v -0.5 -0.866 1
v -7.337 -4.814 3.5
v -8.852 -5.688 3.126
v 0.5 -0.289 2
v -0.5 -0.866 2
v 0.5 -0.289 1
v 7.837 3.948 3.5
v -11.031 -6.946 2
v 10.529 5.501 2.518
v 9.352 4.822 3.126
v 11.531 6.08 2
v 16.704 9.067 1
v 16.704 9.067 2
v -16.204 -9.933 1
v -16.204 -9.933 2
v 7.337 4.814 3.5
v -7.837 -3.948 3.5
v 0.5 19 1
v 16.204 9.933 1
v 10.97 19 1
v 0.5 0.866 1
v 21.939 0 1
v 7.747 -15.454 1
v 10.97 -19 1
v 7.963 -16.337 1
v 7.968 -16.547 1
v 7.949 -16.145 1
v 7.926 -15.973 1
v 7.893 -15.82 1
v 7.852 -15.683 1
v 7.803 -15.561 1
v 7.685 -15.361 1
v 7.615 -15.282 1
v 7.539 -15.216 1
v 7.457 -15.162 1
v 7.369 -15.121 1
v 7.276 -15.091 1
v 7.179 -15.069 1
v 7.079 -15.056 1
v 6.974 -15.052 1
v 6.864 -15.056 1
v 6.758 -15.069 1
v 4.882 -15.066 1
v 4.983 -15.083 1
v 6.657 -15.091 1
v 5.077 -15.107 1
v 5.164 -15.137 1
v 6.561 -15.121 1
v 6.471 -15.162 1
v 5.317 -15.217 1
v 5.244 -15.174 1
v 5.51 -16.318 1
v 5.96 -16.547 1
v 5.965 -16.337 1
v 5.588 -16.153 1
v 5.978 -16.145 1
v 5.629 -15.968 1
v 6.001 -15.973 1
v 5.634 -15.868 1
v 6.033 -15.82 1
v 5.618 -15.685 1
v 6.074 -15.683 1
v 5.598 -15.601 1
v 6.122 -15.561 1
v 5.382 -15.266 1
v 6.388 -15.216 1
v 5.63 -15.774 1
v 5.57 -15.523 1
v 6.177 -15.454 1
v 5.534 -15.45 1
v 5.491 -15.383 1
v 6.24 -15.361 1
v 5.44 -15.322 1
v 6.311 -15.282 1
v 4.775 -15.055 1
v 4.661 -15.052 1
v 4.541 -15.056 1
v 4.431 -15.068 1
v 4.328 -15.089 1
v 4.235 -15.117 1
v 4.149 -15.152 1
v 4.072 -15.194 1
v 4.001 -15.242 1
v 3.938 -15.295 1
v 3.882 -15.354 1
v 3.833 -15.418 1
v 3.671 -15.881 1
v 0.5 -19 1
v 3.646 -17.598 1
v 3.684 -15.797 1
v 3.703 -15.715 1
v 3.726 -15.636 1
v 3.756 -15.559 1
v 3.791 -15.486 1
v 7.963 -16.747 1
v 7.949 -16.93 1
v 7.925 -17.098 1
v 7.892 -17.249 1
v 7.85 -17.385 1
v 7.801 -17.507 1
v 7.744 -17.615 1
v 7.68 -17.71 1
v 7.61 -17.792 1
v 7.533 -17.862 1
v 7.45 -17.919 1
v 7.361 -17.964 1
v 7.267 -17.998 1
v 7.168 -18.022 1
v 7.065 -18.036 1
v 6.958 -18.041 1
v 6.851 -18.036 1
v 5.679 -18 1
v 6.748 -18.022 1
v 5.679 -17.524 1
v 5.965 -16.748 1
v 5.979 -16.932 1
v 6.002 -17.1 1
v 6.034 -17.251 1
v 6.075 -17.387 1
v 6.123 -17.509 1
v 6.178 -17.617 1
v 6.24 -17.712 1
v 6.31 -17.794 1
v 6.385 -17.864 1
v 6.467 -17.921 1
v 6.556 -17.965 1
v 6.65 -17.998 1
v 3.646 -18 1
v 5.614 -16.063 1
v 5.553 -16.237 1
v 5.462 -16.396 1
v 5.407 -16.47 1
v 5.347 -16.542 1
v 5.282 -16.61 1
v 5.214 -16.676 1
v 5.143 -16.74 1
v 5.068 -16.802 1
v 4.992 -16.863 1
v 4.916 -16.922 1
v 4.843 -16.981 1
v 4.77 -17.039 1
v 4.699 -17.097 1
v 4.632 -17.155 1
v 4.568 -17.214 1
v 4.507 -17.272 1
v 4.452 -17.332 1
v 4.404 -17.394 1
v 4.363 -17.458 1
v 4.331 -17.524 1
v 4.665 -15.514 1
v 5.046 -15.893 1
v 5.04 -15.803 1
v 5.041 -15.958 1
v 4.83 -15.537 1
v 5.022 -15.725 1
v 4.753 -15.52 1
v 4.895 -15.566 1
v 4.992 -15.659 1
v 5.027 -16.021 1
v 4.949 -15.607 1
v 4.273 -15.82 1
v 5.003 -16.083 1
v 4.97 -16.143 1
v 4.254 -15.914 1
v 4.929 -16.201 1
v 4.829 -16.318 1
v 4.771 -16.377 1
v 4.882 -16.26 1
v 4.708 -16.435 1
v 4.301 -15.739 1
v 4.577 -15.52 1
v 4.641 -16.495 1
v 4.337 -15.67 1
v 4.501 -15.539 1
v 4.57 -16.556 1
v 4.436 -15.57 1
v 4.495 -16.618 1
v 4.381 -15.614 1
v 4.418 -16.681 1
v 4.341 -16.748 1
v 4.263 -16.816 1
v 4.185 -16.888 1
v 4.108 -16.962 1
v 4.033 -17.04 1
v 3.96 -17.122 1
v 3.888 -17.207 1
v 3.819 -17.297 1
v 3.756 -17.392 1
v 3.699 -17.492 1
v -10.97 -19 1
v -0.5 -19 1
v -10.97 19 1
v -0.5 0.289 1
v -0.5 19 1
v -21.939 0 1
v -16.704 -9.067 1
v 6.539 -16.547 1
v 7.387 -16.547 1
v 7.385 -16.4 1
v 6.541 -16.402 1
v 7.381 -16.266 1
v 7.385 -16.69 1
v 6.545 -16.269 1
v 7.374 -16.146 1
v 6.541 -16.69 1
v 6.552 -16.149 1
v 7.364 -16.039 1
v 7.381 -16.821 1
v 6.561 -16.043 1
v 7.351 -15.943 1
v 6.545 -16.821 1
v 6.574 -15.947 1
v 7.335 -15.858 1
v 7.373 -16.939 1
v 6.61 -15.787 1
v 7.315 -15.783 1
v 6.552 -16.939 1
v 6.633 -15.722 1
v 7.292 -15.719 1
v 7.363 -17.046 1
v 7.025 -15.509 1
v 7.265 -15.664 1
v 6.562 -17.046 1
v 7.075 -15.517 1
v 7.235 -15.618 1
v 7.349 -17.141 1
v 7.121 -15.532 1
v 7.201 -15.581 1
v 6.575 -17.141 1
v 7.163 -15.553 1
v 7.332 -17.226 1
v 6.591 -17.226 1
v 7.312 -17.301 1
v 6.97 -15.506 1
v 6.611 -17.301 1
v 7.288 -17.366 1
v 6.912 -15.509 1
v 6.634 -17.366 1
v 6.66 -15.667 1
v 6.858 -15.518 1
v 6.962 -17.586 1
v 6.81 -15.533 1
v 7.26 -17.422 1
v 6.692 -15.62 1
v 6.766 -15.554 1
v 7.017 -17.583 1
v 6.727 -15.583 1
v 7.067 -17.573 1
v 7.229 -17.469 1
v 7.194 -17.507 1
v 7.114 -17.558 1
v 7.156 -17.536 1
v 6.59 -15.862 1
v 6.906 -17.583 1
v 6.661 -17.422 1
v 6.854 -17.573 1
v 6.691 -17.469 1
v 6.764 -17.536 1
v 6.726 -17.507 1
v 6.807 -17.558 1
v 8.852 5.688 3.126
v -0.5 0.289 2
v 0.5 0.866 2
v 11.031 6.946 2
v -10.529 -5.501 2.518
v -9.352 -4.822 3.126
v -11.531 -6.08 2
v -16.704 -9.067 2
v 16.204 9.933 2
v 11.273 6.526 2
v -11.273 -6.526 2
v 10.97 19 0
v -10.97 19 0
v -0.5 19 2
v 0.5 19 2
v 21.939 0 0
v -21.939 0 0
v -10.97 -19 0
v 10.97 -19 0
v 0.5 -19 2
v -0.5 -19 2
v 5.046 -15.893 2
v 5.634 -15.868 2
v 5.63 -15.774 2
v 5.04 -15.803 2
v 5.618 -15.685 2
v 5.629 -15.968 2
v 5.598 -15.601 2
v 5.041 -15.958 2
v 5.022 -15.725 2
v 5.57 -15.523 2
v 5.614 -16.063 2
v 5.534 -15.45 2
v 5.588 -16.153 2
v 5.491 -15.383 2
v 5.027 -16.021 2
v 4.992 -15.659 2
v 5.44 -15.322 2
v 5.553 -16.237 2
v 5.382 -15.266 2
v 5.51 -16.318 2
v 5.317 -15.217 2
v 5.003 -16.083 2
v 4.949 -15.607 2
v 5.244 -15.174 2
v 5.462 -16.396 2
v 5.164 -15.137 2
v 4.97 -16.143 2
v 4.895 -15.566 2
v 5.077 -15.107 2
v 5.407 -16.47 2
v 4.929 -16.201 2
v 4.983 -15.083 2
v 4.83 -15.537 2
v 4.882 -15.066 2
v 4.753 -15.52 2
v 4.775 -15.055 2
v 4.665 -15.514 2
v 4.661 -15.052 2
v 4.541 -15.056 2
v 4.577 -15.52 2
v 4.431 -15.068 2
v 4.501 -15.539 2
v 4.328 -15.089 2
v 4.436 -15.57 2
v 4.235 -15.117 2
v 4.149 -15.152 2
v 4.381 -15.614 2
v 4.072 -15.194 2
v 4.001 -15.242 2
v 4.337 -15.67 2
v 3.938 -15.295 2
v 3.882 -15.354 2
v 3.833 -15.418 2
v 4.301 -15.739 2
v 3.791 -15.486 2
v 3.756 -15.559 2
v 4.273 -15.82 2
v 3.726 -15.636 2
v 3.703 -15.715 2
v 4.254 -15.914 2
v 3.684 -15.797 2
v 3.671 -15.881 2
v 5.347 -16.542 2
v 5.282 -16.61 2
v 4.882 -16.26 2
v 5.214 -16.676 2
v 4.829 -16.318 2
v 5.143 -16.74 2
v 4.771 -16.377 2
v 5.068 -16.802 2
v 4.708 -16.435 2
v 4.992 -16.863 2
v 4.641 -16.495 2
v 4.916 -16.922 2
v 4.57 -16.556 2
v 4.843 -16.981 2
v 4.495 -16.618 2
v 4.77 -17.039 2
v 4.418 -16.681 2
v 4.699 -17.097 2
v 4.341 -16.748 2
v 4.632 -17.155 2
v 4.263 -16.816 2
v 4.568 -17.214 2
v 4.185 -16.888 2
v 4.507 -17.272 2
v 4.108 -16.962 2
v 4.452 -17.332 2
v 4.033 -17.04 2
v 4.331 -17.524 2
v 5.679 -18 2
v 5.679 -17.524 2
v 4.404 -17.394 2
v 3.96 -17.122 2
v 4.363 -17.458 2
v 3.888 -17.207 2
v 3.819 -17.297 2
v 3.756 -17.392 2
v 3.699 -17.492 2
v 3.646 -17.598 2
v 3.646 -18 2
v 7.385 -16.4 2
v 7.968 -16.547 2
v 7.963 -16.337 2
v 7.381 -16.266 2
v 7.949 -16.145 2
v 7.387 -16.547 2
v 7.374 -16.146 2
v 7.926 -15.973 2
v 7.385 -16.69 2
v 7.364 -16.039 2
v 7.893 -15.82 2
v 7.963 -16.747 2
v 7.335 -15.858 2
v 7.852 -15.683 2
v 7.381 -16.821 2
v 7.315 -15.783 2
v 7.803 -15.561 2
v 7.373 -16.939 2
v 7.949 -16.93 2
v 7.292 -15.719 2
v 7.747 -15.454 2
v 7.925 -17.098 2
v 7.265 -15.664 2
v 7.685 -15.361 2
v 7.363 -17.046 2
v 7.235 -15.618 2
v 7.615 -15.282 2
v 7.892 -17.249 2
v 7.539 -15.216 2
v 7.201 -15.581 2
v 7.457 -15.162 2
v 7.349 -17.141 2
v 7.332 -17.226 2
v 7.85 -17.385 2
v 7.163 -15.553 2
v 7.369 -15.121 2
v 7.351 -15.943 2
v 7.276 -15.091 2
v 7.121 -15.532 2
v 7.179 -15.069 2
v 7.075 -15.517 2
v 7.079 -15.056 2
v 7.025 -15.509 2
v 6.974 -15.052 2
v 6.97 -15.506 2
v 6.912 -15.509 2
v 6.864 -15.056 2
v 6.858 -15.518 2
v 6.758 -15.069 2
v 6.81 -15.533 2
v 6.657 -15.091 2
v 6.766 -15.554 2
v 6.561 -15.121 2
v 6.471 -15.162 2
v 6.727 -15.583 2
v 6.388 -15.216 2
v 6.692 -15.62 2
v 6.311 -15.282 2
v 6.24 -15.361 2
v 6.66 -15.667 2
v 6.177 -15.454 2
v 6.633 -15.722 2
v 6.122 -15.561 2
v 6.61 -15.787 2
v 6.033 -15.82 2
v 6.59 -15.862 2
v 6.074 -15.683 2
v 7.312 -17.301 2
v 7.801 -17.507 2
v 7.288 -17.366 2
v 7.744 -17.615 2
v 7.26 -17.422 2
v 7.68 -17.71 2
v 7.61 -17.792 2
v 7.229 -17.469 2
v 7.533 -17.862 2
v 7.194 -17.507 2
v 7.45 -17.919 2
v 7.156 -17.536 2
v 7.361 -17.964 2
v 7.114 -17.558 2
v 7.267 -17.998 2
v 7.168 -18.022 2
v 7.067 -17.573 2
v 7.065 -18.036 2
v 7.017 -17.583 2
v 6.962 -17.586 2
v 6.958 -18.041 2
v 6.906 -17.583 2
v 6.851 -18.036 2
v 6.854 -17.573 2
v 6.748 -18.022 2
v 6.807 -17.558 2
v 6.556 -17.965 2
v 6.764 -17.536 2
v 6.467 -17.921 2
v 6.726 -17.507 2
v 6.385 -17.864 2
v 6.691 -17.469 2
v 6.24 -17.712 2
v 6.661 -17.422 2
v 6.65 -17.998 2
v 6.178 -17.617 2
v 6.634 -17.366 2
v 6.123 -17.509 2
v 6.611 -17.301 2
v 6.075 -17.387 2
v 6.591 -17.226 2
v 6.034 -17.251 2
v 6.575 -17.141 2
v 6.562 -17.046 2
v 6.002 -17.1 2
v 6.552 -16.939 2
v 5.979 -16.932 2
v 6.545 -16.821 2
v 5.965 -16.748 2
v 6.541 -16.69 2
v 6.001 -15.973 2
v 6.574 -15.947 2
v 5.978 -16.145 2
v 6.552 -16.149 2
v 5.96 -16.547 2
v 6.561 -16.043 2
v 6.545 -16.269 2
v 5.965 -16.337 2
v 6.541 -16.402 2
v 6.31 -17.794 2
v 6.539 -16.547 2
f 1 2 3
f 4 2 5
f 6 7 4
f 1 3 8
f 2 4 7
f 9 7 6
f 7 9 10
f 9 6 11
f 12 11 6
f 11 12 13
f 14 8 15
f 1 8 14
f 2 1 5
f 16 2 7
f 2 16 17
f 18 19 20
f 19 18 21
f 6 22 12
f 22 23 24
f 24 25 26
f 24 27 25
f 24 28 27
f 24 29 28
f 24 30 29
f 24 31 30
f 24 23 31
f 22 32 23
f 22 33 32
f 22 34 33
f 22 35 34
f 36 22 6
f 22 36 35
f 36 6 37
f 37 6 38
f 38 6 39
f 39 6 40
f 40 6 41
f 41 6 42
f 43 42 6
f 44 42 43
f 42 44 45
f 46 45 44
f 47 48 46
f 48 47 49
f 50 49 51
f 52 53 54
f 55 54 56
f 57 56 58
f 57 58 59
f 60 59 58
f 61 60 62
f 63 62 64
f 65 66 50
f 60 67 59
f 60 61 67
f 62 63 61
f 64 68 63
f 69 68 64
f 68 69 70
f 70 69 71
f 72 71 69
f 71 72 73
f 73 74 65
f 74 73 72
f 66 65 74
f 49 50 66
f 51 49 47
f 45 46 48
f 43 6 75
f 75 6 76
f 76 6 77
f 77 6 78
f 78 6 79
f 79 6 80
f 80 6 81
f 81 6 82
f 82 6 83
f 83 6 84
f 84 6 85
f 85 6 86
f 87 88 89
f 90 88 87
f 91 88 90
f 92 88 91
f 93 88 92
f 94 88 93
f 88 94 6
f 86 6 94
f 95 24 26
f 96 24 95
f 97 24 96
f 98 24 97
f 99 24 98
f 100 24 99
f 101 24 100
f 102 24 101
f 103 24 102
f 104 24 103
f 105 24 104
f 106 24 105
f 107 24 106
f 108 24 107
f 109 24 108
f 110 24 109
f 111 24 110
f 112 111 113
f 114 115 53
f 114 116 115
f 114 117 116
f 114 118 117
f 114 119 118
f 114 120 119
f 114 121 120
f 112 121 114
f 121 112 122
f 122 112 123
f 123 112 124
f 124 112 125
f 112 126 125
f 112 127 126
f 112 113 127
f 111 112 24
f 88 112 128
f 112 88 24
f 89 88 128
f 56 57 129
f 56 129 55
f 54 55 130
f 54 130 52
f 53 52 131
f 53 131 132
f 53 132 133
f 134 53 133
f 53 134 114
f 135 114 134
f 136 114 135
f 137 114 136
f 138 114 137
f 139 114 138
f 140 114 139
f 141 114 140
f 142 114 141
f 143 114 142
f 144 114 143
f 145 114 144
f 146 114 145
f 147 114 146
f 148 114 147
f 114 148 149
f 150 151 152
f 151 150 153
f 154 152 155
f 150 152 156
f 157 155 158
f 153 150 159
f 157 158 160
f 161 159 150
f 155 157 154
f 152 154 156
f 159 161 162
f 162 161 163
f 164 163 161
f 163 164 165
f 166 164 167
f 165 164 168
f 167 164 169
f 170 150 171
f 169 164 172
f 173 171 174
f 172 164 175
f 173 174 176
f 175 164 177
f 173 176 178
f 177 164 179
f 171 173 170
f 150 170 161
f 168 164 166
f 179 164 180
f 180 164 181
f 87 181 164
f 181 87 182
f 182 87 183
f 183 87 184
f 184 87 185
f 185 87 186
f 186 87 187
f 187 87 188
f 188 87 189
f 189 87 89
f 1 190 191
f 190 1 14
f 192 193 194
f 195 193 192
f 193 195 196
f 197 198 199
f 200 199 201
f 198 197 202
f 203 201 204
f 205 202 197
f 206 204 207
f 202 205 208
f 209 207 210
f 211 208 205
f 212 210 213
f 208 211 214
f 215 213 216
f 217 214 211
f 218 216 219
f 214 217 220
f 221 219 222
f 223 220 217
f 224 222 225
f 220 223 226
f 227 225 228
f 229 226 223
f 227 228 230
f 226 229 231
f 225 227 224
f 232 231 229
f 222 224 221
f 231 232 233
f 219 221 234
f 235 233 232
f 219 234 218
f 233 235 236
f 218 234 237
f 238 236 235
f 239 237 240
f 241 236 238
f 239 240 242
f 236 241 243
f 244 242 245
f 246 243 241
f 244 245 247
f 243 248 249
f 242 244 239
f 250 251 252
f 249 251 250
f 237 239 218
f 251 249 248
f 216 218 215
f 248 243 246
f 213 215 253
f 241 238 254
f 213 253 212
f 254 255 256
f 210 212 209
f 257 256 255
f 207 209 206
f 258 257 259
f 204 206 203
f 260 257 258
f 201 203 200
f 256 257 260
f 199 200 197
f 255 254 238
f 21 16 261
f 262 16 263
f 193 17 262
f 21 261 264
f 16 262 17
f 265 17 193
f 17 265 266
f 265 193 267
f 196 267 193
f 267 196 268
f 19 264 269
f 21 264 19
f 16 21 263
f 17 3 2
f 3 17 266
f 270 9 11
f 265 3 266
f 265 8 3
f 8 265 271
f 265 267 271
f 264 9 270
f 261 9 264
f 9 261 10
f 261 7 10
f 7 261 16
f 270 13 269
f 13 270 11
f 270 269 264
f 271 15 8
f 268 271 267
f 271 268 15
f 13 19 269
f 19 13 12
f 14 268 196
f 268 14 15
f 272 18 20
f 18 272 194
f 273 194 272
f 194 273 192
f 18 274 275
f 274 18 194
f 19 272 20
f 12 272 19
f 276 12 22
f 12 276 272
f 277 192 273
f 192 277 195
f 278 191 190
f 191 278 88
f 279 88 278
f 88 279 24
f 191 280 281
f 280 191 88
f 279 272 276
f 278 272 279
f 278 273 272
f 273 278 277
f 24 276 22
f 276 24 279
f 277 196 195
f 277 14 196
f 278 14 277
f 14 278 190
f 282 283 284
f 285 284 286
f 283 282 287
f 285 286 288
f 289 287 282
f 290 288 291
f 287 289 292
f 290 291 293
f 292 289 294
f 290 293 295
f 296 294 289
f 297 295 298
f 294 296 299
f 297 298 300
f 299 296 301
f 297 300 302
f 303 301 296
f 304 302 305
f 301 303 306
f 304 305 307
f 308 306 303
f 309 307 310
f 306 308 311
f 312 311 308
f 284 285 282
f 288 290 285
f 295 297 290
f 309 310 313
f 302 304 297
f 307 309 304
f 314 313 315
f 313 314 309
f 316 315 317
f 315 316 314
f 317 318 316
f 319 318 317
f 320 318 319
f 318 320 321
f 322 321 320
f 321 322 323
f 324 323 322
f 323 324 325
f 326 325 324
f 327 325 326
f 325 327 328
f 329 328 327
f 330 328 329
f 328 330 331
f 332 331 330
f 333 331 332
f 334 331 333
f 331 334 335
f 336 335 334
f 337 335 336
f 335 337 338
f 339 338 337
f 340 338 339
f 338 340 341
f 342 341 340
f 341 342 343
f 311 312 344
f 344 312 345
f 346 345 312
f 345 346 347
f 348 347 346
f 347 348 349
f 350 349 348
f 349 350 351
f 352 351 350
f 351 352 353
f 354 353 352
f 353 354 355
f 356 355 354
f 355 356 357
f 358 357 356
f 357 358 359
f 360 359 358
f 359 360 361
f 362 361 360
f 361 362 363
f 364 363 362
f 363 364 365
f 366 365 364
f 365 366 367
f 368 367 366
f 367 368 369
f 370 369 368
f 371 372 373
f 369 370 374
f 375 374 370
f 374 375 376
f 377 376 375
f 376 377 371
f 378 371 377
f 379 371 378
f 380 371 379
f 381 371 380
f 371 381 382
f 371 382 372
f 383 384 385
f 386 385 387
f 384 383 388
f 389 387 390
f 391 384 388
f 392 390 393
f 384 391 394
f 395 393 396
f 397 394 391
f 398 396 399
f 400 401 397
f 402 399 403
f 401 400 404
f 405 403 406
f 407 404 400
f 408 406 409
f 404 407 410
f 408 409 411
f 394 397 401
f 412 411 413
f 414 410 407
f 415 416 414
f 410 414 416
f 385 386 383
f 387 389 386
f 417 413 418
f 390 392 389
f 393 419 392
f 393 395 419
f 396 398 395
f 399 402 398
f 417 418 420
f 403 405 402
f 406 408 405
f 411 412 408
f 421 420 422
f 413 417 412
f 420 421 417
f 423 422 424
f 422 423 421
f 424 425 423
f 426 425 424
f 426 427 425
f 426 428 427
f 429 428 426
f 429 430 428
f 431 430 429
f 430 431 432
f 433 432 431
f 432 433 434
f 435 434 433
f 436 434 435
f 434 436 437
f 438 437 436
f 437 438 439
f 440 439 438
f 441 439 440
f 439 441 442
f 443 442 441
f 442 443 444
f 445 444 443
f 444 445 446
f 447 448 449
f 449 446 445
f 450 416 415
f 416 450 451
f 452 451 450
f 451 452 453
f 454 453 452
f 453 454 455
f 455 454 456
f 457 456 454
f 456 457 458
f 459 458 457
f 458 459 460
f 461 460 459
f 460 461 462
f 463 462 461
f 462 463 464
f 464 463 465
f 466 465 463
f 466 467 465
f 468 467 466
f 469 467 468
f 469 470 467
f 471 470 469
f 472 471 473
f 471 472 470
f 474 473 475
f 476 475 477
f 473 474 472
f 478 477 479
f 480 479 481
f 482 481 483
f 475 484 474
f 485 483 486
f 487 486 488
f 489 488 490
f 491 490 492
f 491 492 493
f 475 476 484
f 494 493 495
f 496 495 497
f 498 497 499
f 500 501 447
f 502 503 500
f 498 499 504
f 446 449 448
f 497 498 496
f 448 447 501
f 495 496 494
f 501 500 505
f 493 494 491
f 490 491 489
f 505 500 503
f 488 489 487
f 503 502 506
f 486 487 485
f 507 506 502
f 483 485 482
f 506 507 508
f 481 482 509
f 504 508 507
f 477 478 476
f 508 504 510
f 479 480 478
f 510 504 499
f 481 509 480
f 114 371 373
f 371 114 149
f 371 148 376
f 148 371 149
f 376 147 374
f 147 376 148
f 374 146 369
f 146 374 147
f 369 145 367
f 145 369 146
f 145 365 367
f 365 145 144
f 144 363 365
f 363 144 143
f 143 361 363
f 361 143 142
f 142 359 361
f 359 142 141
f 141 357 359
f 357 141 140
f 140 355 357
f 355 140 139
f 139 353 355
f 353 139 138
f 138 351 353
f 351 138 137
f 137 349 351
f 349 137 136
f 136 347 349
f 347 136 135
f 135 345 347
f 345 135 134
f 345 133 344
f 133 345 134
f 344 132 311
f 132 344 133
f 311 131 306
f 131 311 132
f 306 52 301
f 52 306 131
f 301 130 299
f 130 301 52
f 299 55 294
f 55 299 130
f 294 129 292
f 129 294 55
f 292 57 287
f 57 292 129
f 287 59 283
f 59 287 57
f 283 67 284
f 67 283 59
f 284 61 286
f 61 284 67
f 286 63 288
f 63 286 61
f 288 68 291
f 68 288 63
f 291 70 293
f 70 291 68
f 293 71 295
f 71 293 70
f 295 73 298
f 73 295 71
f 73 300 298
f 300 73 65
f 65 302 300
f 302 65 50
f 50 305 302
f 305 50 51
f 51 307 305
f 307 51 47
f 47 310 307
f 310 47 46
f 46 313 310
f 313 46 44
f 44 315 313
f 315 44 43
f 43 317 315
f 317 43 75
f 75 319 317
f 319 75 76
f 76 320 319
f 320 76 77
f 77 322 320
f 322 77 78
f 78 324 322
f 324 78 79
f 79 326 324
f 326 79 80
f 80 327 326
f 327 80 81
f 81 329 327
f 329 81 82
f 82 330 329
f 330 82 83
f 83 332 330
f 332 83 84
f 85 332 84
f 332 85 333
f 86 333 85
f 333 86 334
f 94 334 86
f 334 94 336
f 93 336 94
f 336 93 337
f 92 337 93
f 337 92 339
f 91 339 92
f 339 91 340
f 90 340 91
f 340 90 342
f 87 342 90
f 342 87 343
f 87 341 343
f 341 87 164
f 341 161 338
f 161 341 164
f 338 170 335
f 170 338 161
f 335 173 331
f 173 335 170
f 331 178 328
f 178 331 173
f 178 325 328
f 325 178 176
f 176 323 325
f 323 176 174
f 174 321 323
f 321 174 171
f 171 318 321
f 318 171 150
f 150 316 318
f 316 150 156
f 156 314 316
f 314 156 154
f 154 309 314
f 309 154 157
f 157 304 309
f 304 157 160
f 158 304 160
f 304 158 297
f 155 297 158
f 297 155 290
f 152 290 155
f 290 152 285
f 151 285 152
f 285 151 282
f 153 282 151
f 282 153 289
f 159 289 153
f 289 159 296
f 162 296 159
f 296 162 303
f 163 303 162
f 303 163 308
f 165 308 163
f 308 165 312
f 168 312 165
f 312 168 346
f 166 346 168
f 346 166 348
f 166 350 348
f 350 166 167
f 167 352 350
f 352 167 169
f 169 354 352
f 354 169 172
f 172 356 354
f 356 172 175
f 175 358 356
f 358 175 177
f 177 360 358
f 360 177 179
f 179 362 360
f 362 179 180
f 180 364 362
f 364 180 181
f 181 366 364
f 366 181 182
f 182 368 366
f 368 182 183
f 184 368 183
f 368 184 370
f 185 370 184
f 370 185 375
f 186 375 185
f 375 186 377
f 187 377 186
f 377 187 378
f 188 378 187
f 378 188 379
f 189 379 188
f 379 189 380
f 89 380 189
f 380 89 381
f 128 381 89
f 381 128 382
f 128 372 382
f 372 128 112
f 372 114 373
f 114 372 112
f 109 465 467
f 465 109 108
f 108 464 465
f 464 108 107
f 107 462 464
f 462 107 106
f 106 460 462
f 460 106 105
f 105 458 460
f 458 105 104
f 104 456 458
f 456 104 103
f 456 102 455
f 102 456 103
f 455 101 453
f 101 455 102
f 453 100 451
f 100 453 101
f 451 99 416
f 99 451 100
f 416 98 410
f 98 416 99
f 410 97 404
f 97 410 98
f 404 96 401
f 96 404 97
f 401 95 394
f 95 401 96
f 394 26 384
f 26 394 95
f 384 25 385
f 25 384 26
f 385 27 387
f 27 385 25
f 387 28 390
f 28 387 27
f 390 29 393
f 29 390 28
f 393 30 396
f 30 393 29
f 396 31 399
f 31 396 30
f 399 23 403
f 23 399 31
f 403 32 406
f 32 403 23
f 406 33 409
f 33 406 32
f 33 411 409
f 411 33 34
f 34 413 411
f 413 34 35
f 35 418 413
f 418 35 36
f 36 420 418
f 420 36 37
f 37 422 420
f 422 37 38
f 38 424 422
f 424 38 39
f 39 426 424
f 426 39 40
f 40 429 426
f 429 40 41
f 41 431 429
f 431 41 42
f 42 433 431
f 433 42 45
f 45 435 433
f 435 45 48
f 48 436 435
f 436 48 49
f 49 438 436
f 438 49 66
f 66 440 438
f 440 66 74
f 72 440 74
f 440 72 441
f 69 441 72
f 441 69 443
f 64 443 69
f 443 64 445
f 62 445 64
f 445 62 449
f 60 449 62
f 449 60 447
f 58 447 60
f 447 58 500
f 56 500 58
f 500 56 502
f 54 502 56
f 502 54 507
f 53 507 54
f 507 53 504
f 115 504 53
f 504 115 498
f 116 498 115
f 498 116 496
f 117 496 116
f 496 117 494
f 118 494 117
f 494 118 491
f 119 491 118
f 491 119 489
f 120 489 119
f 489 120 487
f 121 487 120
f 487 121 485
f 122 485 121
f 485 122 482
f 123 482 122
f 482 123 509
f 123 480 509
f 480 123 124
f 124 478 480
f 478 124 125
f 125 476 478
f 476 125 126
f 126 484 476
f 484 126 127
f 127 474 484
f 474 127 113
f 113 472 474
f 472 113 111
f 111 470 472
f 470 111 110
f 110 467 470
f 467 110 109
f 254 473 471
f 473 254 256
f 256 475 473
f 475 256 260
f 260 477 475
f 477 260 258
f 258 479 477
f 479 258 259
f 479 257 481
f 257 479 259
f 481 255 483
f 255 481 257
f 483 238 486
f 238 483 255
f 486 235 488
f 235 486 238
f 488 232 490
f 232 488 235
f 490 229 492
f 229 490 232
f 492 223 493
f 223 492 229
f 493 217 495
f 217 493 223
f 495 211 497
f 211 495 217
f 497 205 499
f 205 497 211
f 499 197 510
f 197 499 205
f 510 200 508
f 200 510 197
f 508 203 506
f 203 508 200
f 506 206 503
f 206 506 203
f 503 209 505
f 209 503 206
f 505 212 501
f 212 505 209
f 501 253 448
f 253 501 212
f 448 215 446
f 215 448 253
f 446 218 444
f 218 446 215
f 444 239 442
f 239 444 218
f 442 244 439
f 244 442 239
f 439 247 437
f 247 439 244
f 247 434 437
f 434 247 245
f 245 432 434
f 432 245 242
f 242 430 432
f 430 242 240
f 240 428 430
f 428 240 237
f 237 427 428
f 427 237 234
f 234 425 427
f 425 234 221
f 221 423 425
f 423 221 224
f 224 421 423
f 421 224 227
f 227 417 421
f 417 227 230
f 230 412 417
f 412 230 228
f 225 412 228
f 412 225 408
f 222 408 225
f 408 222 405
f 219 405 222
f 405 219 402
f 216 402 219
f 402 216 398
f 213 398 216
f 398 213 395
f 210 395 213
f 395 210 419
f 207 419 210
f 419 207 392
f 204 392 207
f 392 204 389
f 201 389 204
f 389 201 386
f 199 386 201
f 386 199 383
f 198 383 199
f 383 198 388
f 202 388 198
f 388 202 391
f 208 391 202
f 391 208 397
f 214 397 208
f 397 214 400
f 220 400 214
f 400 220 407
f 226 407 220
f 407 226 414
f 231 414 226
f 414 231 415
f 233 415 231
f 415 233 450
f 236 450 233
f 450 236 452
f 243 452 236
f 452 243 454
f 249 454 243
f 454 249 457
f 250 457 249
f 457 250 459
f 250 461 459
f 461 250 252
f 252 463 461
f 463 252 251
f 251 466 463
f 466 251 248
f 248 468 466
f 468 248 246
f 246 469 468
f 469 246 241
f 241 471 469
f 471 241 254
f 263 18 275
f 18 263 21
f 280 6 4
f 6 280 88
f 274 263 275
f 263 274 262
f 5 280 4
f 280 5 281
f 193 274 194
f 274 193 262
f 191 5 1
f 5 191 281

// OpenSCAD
include <../Scripts/18xx tiles basic functions.scad>
hex("Green");
put_tilenr("20");
straight_line_bridge(r=5);
straight_line(r=0);
